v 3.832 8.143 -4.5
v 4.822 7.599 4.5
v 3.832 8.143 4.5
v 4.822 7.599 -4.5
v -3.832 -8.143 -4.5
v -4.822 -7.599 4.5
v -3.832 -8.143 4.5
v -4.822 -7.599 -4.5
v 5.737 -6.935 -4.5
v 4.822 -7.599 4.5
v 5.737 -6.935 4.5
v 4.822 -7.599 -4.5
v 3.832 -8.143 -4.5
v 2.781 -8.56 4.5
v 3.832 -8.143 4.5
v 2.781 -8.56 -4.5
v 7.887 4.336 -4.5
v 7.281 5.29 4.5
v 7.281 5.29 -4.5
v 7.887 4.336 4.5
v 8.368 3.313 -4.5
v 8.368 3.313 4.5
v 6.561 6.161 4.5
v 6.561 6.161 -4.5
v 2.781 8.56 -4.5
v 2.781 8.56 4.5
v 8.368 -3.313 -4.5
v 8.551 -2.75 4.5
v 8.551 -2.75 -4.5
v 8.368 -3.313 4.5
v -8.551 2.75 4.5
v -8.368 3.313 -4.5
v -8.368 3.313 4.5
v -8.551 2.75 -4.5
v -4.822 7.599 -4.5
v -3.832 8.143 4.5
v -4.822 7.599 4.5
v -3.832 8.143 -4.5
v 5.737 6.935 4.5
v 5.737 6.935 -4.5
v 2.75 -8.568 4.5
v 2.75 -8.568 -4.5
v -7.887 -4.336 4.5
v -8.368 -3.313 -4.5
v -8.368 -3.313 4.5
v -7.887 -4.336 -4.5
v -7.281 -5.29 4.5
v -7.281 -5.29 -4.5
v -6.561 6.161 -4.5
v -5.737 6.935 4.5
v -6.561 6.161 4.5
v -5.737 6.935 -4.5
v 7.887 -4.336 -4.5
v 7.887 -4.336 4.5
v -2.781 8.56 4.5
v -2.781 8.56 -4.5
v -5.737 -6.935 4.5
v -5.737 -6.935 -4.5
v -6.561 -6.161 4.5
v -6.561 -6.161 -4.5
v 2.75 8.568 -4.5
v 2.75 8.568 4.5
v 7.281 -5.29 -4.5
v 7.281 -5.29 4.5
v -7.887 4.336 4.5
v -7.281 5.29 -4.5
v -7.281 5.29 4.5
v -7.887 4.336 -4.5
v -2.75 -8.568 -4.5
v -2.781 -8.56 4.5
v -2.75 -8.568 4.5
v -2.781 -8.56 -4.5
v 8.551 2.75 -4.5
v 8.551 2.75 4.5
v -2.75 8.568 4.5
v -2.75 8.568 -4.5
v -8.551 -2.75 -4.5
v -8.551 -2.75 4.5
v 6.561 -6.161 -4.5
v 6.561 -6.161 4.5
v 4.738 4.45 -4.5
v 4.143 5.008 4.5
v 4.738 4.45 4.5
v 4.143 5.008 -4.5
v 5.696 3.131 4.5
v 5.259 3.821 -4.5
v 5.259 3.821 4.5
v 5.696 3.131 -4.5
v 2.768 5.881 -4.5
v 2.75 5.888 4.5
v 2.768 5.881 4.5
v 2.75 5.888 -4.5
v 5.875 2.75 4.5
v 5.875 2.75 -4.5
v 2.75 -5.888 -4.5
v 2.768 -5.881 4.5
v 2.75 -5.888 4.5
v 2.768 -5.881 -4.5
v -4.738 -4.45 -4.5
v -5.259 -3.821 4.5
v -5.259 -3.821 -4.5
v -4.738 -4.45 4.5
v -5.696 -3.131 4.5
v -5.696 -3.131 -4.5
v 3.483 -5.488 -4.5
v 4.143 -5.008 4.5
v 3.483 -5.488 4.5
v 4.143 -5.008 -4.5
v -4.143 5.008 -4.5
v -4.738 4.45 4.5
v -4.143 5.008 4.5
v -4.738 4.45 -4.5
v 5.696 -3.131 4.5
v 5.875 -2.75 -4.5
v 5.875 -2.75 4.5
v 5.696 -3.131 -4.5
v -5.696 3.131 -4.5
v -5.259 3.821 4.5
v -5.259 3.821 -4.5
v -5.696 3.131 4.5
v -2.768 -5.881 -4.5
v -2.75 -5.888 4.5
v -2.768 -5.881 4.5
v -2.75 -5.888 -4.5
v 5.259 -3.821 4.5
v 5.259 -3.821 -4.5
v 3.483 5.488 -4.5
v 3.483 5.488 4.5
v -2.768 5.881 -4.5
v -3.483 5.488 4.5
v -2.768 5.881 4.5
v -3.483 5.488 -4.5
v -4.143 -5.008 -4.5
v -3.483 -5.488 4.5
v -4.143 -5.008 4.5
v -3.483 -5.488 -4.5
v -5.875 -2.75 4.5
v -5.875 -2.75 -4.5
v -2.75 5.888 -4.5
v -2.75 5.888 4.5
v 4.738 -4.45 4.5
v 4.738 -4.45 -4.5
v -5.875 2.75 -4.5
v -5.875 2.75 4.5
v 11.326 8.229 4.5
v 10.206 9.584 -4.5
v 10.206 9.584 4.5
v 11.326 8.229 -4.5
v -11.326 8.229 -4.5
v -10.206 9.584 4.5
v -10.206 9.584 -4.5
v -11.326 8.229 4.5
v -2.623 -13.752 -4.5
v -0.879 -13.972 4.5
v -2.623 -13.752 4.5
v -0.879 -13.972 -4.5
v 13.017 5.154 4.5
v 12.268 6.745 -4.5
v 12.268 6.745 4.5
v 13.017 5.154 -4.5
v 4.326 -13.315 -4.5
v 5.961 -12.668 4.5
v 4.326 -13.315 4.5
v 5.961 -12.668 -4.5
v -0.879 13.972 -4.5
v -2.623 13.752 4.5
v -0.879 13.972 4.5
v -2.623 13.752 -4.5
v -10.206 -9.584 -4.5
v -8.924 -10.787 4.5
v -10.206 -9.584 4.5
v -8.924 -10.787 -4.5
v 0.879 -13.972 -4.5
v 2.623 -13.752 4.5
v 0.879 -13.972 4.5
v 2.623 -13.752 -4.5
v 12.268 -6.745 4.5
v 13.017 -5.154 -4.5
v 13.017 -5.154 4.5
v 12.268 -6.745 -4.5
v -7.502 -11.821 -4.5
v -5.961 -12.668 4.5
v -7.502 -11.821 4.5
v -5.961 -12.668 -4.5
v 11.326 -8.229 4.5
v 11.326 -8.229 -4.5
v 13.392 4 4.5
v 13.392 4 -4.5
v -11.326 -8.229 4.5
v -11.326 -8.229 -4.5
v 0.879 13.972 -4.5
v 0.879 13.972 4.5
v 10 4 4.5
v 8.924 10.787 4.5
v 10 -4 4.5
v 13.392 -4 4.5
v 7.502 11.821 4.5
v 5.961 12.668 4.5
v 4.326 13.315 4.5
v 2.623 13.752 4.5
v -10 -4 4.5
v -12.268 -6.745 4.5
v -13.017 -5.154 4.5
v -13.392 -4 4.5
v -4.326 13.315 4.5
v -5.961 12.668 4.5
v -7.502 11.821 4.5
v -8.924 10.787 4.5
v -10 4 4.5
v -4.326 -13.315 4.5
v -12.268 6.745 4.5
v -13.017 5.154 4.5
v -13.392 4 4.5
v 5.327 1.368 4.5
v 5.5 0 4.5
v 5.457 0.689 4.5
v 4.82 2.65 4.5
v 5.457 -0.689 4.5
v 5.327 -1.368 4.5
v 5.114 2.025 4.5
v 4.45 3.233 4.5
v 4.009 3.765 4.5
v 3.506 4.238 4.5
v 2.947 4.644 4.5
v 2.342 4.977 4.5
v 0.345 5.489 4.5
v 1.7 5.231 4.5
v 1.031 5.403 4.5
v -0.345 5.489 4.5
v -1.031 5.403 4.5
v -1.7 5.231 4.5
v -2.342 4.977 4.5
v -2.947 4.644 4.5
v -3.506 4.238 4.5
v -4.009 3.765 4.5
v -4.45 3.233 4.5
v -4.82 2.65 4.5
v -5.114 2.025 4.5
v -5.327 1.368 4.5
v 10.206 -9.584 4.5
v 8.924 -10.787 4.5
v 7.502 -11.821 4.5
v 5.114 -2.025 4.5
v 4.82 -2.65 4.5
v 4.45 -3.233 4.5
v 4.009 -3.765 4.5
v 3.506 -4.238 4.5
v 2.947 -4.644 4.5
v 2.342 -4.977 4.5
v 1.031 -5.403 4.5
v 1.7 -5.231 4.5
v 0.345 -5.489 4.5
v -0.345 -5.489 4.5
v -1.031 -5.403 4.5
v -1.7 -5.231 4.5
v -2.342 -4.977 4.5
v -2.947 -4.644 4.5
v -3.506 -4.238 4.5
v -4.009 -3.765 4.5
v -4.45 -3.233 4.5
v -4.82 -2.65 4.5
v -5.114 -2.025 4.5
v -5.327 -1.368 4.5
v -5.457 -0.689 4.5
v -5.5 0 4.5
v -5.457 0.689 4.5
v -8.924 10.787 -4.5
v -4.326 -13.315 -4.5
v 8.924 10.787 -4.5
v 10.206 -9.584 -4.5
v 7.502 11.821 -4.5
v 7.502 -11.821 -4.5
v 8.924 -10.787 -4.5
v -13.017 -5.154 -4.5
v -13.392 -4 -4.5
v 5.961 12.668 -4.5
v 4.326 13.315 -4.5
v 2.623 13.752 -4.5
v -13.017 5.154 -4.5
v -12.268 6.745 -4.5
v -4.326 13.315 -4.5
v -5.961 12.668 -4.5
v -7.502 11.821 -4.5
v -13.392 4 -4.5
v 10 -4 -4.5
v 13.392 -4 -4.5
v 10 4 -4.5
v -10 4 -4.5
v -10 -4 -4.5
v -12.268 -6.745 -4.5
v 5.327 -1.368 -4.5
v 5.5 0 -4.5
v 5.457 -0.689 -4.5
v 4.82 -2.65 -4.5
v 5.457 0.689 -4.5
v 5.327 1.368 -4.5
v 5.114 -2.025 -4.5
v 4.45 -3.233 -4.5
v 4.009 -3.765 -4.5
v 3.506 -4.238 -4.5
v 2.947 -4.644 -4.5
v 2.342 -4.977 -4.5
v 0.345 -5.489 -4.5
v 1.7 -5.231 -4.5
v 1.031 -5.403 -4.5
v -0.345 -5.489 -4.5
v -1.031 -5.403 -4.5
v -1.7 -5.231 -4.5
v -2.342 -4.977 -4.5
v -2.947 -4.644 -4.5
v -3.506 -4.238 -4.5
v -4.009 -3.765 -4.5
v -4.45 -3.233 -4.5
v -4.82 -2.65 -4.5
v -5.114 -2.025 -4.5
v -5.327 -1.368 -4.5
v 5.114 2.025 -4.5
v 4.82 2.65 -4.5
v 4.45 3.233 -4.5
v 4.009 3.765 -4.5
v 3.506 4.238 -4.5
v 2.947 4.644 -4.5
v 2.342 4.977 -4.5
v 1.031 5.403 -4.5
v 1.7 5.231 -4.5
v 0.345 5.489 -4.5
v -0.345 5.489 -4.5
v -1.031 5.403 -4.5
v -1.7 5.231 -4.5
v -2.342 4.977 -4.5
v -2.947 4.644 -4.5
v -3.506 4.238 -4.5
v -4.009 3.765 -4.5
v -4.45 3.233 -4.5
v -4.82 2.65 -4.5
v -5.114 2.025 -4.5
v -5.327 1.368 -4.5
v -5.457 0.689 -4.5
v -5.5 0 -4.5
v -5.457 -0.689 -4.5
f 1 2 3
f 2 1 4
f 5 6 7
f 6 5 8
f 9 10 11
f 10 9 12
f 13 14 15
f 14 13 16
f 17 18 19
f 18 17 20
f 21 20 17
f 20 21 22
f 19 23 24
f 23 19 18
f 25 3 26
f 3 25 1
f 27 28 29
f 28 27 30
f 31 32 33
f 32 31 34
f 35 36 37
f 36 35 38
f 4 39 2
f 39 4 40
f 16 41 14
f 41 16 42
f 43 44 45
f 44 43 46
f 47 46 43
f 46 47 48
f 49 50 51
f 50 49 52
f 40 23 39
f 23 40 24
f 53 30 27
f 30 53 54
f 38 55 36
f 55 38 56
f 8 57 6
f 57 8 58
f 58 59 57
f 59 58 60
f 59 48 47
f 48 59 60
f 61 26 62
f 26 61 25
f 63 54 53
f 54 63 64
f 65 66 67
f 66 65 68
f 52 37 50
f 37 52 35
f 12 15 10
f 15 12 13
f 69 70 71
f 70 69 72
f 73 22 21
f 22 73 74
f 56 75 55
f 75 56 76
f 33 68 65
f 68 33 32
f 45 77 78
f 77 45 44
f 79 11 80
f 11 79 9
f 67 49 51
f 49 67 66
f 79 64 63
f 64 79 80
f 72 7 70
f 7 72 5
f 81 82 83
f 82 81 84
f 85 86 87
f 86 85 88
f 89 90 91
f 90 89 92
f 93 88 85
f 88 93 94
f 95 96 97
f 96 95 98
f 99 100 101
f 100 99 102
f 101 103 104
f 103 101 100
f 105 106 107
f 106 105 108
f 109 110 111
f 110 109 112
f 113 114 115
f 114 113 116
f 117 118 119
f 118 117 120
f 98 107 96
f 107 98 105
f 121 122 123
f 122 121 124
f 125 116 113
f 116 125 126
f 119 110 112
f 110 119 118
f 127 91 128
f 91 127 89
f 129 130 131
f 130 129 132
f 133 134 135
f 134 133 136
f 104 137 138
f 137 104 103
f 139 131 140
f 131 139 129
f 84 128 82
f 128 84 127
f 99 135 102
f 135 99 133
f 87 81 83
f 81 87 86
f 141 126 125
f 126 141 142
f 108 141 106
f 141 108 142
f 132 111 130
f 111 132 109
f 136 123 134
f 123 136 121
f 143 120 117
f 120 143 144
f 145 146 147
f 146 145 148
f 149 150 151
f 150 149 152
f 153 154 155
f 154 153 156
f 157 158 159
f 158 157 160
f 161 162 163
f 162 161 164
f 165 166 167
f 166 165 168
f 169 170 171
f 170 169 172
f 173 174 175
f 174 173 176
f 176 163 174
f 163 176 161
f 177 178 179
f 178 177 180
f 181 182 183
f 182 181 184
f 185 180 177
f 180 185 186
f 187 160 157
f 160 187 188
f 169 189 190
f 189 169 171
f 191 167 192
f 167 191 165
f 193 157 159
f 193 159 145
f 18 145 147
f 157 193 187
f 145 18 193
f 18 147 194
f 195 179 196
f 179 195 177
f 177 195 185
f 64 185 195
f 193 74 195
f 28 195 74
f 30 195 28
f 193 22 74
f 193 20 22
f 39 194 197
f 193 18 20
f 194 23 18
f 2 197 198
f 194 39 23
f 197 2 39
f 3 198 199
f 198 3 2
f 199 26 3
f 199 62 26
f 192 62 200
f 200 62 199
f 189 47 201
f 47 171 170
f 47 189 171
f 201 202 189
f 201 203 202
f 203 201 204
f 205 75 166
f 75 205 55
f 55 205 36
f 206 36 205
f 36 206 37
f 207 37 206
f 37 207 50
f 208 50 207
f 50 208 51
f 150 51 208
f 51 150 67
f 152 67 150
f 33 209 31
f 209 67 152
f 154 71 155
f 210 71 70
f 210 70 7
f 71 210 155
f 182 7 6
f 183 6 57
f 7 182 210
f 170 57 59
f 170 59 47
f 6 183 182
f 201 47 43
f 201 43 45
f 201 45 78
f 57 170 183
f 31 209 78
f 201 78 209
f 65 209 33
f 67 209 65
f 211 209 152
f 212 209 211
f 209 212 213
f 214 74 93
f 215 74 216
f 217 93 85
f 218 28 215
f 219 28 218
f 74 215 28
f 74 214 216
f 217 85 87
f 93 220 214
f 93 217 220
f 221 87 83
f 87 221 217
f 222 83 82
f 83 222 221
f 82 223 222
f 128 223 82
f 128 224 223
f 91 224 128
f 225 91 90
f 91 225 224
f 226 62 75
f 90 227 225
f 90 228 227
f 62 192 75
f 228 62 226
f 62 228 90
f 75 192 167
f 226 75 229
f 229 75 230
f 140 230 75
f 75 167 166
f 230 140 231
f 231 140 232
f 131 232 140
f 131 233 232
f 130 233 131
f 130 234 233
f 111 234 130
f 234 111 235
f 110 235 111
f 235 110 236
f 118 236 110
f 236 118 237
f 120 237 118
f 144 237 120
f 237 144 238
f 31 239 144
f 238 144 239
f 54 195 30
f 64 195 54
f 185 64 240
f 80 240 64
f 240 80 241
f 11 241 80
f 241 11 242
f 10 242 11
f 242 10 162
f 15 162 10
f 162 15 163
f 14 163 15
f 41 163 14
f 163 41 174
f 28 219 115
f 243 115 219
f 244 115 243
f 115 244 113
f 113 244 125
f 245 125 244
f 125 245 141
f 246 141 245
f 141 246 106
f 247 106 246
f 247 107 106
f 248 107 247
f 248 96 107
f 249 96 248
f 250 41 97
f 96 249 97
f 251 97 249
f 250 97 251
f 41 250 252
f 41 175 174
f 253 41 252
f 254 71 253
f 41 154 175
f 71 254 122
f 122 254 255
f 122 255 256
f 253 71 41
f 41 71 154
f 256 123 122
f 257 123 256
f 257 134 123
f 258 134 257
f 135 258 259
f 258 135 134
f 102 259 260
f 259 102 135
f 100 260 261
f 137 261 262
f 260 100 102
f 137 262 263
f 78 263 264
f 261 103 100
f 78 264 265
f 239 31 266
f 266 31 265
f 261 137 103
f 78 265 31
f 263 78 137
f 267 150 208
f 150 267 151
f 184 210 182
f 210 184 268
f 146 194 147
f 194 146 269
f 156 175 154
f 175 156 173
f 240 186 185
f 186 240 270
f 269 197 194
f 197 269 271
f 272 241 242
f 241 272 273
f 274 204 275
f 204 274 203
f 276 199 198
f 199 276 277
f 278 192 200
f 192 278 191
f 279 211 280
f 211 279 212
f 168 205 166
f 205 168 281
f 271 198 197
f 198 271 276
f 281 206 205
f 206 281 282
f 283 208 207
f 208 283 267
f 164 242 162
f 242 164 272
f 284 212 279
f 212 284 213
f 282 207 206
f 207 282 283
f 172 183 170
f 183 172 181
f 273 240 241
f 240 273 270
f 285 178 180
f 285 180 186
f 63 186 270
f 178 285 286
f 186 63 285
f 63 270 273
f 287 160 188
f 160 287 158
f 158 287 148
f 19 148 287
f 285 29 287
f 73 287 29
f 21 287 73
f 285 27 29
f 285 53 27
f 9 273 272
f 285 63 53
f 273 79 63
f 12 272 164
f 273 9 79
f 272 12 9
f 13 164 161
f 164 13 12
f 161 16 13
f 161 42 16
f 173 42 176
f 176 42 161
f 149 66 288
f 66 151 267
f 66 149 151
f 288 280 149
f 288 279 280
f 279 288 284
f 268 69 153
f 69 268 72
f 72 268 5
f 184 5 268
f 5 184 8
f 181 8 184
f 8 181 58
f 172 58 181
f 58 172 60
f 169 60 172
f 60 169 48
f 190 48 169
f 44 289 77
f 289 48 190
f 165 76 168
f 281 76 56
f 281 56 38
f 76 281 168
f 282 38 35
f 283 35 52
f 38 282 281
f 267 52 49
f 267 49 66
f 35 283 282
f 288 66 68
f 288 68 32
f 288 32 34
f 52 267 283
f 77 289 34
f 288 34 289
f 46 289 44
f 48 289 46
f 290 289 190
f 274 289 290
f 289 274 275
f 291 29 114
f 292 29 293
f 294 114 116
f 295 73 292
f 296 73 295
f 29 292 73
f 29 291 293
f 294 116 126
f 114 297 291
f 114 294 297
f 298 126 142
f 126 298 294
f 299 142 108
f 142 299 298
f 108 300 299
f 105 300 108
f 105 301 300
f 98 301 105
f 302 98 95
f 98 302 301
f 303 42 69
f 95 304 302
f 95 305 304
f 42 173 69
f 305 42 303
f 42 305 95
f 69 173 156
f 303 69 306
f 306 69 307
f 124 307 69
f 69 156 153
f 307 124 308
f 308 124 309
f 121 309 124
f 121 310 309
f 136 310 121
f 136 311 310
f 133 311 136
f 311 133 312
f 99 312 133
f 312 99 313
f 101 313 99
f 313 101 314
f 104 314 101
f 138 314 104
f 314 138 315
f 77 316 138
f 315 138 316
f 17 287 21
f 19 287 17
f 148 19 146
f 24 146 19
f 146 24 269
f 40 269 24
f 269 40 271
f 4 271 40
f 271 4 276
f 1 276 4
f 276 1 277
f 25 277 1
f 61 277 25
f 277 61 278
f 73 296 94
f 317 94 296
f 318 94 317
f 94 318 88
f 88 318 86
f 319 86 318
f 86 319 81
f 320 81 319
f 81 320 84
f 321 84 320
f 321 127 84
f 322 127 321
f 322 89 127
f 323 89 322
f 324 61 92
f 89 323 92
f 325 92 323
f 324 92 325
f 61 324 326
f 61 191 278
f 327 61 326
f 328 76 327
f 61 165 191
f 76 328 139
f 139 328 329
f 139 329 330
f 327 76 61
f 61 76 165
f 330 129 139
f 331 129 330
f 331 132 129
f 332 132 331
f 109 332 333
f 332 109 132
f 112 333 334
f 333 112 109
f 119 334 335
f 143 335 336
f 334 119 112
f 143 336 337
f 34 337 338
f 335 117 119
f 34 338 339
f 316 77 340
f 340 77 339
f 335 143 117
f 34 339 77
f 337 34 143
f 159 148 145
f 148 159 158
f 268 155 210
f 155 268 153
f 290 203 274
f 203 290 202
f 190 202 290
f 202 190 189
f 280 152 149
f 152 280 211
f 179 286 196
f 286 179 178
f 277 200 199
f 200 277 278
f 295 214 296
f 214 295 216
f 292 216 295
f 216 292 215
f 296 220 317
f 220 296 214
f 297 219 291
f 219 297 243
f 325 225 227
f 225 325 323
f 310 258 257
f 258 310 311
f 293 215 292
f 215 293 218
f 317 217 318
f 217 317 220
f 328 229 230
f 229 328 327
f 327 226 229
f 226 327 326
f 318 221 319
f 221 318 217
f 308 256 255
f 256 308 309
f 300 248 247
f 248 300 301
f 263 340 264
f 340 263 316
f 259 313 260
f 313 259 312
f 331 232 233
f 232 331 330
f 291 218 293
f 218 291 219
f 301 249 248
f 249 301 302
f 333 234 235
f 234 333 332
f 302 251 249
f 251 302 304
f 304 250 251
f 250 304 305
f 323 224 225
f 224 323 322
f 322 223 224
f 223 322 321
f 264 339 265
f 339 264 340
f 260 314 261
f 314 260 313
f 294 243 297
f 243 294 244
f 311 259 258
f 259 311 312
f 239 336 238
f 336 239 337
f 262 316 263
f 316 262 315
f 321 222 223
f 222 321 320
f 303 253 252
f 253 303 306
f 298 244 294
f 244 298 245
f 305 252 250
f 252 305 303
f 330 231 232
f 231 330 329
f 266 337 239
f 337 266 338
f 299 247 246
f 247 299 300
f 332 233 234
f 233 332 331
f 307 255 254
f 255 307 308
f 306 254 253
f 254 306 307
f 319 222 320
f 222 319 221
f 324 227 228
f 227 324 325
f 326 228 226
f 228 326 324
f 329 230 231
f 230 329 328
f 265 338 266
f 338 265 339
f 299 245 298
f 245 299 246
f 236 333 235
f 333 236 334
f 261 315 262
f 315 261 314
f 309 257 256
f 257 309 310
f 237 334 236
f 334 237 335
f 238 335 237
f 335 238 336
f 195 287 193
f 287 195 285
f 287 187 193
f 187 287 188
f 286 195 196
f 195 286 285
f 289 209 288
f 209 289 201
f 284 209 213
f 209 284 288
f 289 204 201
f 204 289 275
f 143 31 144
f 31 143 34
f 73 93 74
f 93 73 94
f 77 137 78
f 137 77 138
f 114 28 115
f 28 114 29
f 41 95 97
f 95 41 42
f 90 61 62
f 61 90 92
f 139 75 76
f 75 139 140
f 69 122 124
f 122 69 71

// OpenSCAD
// ------------------------------ CONFIGURATION ------------------------------
//motor dimension
motor_diameter = 28;
plate_height = 9;

//center hole
hole_diameter = 11;

//motor cable connectors
connector_height = 8;
connector_width = 4;

// ------------------------------ CALCULATIONS ------------------------------

plate_radius = motor_diameter/2;
hole_radius = hole_diameter/2;

// ------------------------------ DRAWING ------------------------------
difference(){
    //main plate
    cylinder($fn = 50, plate_height, plate_radius, plate_radius, true);
    //center hole
    cylinder($fn = 50, plate_height+2, hole_radius, hole_radius, true);
    //cable connectors
    translate([plate_radius-connector_width/2, 0, 0]){
        cube([connector_width, connector_height, plate_height+2], true);
    }
        translate([-plate_radius+connector_width/2, 0, 0]){
        cube([connector_width, connector_height, plate_height+2], true);
    }
    //air ventilation holes
    difference(){
        cylinder($fn = 50, plate_height+2, plate_radius-connector_width-1, plate_radius-connector_width-1, true);
        cylinder($fn = 50, plate_height+2, hole_radius+1, hole_radius+1, true);
    }
}

//cross
difference(){
    cube([2*(plate_radius-connector_width)-1, hole_radius, plate_height], true);
    //center hole
    cylinder($fn = 50, plate_height+2, hole_radius, hole_radius, true);
}
difference(){
    cube([hole_radius, 2*(plate_radius-connector_width)-1, plate_height], true);
    //center hole
    cylinder($fn = 50, plate_height+2, hole_radius, hole_radius, true);
}
